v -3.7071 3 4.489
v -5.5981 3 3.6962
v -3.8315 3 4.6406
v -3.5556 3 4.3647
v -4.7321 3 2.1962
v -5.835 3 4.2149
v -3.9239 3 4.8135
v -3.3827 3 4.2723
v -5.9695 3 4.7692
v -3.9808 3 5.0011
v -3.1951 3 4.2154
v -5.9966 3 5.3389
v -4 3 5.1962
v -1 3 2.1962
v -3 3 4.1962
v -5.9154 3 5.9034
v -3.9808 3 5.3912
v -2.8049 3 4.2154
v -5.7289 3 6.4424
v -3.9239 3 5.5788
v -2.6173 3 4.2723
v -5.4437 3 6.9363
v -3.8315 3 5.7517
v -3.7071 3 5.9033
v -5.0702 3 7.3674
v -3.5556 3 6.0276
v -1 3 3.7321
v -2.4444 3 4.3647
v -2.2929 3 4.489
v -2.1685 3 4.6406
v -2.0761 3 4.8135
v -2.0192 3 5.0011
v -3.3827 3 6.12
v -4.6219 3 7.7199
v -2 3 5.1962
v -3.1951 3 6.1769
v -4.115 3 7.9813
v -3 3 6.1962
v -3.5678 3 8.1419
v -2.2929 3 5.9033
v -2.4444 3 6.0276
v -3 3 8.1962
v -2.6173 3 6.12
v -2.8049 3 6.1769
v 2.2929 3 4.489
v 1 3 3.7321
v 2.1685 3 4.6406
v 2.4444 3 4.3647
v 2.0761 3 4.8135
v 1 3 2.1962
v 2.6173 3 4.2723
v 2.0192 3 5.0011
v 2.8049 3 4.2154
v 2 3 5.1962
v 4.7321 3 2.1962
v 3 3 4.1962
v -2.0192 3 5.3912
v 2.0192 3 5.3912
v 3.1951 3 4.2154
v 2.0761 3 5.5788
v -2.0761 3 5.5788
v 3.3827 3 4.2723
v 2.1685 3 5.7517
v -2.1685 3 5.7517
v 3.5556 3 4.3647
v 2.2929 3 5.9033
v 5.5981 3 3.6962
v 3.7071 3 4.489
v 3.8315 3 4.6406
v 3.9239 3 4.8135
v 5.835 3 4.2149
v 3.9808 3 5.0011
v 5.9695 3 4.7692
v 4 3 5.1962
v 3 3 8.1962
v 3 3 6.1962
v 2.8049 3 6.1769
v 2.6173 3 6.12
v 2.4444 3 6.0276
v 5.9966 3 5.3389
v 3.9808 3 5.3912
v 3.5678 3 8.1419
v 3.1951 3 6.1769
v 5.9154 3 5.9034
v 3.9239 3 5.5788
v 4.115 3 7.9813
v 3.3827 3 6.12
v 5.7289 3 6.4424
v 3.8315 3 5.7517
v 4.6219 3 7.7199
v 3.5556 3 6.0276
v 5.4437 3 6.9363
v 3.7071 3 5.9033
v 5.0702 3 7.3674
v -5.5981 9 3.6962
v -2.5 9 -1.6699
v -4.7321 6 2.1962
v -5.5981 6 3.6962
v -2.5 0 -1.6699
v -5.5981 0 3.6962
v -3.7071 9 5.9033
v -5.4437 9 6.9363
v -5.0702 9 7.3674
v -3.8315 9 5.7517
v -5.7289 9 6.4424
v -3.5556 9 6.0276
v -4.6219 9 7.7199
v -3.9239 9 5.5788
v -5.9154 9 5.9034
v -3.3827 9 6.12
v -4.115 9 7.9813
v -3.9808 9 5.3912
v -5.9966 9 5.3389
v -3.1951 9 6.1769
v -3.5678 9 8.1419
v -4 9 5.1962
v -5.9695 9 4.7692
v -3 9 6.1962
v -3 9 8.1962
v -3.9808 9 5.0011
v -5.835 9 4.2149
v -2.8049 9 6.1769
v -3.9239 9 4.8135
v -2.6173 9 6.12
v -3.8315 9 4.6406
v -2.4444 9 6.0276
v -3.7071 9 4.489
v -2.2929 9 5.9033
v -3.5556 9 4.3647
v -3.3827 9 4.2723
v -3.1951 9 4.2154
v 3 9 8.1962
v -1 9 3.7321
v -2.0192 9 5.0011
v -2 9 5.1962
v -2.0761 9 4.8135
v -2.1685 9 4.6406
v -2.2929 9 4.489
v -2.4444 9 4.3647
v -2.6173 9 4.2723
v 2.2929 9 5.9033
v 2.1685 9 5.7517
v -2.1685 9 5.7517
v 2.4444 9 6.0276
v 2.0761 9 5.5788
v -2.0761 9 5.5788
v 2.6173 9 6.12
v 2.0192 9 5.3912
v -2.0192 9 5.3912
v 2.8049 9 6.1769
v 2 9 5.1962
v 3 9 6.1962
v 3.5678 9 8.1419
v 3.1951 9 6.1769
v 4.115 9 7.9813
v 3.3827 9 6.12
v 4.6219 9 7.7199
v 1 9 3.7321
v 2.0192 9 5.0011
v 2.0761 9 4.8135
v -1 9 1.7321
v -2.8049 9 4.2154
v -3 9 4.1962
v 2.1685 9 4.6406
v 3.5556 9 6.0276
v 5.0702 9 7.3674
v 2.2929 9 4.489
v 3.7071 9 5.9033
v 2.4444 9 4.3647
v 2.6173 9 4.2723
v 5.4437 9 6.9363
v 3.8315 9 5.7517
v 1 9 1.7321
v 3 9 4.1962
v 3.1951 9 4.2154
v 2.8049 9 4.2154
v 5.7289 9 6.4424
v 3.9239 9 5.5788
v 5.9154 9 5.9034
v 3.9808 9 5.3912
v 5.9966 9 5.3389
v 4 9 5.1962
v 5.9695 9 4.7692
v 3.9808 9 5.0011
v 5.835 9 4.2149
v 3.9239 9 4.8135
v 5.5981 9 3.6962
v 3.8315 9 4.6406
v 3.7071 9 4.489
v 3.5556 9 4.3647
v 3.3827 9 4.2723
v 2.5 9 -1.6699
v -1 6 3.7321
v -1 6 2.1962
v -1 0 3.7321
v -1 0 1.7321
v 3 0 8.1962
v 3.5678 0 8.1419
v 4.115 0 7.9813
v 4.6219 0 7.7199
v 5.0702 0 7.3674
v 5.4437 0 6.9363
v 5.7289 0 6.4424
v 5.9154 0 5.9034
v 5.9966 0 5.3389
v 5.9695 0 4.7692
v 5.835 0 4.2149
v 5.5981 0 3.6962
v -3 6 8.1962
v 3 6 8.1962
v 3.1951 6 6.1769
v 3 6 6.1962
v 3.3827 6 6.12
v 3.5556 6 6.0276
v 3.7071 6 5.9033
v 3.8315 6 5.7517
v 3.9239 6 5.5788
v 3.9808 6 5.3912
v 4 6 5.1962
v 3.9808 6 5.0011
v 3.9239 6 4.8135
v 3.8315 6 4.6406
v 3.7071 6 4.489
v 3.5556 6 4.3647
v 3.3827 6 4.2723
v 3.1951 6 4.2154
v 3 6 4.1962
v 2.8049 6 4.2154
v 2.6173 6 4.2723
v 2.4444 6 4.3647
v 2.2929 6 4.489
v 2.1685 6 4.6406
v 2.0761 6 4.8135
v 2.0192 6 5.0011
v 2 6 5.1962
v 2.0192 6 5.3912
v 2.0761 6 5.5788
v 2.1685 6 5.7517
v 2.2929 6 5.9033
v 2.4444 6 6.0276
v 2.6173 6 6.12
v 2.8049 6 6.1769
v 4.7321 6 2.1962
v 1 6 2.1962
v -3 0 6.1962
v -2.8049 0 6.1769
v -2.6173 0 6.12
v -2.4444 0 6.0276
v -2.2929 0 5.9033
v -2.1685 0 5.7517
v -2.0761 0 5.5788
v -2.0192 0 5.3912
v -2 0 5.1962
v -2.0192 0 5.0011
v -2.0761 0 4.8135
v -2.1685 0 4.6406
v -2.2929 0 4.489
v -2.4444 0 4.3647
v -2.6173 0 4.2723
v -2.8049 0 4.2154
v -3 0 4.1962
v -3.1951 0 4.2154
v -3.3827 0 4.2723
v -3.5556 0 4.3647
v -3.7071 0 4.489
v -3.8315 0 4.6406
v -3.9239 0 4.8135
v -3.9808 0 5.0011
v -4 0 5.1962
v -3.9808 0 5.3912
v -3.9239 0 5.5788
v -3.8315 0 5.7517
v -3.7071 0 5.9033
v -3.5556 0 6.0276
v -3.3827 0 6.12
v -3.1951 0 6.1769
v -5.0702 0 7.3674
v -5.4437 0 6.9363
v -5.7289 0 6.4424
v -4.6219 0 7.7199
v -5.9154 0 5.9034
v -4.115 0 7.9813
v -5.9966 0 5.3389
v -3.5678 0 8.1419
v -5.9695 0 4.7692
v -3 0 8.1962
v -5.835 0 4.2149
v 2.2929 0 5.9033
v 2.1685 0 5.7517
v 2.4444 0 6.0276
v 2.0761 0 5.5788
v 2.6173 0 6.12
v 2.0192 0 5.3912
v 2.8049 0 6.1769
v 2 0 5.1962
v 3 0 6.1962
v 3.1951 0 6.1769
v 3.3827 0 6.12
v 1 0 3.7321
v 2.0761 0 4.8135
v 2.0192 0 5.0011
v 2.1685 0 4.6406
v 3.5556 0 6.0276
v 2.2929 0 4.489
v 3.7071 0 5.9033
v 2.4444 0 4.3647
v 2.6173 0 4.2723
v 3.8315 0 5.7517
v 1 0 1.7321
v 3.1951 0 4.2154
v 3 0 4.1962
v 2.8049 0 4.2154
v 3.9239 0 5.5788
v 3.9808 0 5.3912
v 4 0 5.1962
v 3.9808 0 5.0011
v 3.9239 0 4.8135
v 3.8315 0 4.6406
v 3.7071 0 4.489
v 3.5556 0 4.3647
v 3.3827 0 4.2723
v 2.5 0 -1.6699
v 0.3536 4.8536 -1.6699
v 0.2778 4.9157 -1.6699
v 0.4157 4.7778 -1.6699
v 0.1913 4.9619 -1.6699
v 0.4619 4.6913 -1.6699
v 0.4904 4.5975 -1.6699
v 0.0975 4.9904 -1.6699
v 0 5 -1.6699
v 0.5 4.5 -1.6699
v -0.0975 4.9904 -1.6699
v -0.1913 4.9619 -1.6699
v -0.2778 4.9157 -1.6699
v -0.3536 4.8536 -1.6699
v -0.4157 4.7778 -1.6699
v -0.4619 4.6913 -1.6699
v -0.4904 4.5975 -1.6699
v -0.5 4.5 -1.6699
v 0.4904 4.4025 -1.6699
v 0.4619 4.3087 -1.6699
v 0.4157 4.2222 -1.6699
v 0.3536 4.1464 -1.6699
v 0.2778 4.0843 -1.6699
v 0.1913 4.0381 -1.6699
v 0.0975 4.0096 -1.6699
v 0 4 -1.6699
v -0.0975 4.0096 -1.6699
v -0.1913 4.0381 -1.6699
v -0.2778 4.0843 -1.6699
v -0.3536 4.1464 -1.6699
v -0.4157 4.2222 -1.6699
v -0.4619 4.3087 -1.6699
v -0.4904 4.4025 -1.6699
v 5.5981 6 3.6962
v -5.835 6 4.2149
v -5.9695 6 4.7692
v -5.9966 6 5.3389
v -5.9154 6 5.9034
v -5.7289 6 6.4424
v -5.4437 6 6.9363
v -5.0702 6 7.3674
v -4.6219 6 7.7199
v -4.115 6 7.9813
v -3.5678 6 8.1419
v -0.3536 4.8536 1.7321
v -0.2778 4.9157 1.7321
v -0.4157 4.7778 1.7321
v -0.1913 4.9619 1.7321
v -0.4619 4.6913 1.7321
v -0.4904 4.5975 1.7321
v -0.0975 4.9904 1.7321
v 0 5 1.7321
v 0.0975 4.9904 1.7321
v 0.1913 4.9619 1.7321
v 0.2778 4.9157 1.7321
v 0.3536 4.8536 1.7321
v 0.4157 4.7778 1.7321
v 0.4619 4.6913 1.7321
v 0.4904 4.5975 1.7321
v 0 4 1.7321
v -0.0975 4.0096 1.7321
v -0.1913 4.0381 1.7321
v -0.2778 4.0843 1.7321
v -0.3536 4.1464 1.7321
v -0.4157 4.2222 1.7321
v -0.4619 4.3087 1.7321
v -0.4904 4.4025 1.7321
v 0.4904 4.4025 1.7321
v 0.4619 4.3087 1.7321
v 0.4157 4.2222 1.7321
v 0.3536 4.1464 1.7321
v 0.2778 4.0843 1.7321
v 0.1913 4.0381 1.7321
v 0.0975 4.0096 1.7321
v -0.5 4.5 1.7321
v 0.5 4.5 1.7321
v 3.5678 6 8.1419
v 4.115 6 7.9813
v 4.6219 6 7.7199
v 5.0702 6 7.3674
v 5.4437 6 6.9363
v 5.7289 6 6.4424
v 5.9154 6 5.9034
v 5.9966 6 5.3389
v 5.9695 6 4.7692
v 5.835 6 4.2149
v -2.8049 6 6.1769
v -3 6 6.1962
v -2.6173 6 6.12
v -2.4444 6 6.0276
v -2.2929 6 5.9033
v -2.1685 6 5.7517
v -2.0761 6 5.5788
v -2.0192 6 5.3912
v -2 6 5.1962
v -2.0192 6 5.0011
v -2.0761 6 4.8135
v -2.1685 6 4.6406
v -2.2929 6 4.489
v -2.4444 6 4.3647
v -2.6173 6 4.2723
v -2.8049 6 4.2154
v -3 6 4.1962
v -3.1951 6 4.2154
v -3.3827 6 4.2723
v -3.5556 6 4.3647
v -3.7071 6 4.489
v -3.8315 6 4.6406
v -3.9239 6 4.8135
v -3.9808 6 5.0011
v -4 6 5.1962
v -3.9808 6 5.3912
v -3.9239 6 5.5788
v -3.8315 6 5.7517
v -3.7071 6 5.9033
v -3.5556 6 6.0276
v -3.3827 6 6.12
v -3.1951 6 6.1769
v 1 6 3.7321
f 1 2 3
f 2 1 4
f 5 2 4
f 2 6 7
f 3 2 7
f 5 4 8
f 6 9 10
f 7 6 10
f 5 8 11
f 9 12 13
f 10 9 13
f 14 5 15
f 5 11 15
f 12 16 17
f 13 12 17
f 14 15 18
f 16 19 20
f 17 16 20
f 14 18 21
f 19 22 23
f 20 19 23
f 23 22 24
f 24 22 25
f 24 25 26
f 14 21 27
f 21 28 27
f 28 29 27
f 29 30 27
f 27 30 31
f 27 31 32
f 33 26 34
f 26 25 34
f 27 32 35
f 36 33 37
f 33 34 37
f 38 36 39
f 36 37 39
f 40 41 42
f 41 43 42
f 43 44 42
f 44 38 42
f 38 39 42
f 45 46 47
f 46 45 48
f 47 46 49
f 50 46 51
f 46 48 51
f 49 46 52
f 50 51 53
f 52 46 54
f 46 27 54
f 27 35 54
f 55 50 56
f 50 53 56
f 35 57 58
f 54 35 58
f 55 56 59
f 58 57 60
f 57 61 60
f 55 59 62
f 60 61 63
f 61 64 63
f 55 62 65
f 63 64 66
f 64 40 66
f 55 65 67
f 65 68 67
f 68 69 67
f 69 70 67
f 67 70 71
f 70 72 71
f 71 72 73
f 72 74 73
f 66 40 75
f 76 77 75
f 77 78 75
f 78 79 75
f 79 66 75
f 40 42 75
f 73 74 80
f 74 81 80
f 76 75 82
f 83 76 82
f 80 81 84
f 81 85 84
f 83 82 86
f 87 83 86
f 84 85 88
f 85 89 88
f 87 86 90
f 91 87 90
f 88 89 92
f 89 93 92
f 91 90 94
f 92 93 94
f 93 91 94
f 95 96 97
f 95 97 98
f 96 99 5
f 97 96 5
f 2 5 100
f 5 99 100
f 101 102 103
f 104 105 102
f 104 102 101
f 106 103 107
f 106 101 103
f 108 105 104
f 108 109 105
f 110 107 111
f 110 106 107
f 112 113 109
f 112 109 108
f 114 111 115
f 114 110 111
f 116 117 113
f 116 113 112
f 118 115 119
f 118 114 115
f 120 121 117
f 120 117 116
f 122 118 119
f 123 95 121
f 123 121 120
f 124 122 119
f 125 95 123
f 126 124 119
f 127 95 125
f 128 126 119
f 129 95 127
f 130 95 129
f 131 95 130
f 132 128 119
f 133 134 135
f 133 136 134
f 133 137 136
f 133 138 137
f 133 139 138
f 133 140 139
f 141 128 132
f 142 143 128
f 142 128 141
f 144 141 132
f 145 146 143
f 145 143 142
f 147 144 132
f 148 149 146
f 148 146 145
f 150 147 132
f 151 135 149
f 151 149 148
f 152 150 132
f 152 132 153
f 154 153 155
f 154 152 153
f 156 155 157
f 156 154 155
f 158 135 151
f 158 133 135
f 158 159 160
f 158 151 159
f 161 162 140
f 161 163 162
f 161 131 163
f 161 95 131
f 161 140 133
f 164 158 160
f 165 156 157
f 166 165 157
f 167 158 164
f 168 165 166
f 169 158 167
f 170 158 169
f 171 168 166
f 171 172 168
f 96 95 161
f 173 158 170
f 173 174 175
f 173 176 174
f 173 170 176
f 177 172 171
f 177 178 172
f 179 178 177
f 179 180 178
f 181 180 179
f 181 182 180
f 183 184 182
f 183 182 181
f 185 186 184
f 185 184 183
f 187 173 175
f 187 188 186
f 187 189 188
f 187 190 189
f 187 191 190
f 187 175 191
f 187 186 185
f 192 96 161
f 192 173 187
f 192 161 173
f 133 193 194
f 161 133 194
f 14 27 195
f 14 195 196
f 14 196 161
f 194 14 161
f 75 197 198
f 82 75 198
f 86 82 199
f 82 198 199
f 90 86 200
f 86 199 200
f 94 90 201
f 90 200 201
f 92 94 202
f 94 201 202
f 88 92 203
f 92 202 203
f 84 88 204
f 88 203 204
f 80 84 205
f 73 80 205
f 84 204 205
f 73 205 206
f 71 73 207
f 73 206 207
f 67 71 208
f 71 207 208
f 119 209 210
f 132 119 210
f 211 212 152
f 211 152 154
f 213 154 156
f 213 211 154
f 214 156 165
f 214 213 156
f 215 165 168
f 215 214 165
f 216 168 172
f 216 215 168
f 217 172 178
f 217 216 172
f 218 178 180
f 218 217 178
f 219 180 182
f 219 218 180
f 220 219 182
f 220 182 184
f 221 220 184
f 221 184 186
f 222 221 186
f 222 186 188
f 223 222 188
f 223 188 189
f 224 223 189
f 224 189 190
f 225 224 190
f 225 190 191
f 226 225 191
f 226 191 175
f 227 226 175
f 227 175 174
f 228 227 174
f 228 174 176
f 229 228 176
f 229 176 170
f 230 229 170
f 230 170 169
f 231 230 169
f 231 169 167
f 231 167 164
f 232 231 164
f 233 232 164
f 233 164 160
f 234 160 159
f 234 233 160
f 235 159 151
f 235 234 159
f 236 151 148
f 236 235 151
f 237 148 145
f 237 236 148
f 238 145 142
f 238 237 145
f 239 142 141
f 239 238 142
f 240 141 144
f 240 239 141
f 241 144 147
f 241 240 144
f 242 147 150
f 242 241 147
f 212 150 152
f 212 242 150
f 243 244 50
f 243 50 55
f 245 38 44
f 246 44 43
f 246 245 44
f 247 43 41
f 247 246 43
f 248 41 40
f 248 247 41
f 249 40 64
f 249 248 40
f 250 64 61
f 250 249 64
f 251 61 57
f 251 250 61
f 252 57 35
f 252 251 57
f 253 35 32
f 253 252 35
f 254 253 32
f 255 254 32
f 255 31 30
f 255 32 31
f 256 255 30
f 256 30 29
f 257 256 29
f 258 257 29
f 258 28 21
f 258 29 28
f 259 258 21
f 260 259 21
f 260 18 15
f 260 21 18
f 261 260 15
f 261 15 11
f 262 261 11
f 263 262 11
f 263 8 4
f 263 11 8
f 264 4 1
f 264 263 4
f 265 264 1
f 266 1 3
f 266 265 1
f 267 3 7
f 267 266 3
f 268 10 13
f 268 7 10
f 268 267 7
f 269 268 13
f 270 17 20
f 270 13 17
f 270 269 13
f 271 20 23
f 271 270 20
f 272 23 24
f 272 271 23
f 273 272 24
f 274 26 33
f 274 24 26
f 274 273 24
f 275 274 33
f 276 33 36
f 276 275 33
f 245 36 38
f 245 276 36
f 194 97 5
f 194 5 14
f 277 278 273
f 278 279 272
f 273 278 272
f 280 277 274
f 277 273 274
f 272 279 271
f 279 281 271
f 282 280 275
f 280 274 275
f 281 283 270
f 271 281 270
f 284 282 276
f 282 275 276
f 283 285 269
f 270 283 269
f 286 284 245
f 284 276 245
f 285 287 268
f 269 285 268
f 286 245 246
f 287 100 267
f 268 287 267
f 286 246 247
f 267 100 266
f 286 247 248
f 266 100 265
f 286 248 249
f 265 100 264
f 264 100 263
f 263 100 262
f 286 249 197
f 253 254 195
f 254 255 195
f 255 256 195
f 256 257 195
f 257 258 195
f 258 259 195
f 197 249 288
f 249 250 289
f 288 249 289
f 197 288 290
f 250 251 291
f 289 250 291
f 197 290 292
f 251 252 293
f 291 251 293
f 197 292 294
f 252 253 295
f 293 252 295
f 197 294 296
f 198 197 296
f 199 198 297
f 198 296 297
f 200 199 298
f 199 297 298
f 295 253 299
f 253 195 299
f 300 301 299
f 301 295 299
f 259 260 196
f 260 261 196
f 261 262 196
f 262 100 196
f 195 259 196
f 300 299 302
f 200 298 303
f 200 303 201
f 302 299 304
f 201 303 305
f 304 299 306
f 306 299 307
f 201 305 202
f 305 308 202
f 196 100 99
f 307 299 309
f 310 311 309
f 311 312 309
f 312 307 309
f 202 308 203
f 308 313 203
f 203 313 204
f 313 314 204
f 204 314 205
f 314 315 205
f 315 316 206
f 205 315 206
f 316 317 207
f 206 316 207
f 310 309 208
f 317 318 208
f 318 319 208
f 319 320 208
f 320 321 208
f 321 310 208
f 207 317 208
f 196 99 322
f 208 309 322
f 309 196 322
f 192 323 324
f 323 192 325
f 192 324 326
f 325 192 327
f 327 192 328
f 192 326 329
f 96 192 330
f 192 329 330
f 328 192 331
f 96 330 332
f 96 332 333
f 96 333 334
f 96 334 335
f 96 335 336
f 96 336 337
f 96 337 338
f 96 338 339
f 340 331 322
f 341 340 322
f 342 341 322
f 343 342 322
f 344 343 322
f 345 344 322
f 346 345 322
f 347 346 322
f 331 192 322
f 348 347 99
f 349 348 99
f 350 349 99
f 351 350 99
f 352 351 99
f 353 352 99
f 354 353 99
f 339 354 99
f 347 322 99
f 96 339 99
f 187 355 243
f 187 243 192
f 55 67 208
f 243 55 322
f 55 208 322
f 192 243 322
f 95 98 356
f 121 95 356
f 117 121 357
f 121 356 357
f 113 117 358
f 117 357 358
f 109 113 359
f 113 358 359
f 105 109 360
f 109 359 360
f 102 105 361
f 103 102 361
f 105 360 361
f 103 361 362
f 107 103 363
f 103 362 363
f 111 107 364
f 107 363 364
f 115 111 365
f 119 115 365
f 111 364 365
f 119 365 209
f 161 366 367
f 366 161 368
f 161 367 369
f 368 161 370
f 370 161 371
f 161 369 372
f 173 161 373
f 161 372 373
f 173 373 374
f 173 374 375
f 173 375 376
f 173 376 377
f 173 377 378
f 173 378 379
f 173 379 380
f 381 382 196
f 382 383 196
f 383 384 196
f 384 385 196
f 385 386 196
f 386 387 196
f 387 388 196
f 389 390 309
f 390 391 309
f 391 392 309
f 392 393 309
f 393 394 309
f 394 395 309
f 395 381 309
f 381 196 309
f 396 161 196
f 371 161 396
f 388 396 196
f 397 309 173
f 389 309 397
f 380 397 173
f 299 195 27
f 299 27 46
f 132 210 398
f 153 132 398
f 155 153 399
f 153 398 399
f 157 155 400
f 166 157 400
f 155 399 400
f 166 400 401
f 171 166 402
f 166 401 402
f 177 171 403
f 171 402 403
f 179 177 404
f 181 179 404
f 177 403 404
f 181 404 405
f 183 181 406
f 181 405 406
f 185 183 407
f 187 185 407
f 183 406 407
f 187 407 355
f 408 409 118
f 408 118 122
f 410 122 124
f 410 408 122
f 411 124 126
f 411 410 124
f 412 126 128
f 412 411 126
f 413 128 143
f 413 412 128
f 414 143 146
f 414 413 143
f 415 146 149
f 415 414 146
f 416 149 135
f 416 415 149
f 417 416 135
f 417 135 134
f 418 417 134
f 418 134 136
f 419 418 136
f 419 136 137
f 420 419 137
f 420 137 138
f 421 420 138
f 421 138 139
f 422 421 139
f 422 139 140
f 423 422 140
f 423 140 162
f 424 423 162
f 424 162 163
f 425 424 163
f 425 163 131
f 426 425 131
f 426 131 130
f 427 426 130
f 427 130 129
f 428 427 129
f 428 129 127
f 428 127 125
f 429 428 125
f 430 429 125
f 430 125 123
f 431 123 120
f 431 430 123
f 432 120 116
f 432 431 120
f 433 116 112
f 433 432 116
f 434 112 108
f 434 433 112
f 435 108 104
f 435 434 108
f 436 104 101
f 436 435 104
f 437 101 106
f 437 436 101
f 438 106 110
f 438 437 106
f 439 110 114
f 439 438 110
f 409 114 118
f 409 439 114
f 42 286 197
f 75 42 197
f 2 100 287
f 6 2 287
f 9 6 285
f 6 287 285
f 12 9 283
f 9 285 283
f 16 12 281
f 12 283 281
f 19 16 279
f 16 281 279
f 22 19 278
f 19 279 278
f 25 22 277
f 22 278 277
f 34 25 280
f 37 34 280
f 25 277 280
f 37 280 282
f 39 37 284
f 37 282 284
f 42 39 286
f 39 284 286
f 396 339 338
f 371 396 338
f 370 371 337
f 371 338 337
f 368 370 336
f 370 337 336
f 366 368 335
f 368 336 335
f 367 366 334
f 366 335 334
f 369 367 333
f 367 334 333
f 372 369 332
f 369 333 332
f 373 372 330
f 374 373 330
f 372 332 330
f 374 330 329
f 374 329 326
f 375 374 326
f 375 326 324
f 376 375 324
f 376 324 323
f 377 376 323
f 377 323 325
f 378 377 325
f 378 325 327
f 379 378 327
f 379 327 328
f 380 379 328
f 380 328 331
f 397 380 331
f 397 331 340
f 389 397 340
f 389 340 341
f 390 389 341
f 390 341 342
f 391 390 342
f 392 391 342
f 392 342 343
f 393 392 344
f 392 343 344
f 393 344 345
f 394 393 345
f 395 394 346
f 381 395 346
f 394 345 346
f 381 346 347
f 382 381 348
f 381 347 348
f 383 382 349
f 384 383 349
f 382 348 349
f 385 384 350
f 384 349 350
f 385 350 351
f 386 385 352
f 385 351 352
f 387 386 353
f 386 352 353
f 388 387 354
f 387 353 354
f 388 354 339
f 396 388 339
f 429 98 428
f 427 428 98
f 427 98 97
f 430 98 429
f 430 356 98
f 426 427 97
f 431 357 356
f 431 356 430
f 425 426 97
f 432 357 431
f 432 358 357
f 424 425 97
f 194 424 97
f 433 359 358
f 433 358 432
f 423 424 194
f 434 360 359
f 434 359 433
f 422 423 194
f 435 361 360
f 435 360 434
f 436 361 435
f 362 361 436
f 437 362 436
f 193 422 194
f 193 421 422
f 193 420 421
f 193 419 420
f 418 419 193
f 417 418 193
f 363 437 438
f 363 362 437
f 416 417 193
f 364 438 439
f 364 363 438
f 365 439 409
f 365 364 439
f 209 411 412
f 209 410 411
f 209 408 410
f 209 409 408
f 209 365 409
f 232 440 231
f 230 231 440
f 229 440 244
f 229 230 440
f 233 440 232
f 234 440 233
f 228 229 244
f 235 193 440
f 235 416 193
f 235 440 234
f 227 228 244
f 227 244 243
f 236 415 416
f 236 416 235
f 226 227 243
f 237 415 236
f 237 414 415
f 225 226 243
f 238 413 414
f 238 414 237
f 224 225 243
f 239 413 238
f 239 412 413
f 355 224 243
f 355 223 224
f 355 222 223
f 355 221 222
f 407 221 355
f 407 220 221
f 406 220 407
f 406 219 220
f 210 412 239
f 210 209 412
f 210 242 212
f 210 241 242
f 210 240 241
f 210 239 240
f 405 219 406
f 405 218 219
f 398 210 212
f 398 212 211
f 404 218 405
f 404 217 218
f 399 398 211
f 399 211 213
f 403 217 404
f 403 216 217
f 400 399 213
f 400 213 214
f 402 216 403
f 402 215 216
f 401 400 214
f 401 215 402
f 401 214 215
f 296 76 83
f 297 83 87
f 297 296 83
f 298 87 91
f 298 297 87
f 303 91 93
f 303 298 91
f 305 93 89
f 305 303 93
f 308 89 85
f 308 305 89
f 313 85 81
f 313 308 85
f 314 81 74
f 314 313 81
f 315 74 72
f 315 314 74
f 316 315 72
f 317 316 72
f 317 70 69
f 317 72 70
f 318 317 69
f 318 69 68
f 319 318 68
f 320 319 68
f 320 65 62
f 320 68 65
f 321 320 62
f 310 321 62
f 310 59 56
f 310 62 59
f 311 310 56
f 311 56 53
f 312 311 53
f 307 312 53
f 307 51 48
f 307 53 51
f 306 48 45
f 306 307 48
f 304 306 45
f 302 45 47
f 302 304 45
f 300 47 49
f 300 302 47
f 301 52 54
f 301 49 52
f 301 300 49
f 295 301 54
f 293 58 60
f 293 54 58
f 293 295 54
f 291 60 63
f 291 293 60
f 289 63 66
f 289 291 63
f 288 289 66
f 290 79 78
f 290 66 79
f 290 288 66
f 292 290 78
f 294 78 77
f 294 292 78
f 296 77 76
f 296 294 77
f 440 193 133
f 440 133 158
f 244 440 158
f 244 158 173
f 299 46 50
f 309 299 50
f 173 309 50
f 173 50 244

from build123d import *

# Parameters (mm, degrees)
CROQUIS1_R              = 1
CROQUIS1_W              = 2
CROQUIS1_H              = 2
SALIENTE_EXTRUIR1_DEPTH = 9
CROQUIS2_W              = 12
CROQUIS2_H              = 3
CORTAR_EXTRUIR1_DEPTH   = 6
CORTAR_EXTRUIR2_REACH   = 16.64
CROQUIS3_R              = 0.5


with BuildPart() as part:
    # Croquis1 → Saliente-Extruir1 (new body)
    with BuildSketch(Plane(origin=(0, 0, 0), x_dir=(1, 0, 0), z_dir=(0, 1, 0))):
        with BuildLine():
            Line((5.598076211, -3.696152423), (2.5, 1.669872981))
            Line((2.5, 1.669872981), (-2.5, 1.669872981))
            Line((-2.5, 1.669872981), (-5.598076211, -3.696152423))
            ThreePointArc((-5.598076211, -3.696152423), (-5.598076211, -6.696152423), (-3, -8.196152423))
            Line((-3, -8.196152423), (3, -8.196152423))
            ThreePointArc((3, -8.196152423), (5.598076211, -6.696152423), (5.598076211, -3.696152423))
        make_face()
        with Locations(Location((-3, -5.196152423, 0), (0, 0, 270))):
            Circle(CROQUIS1_R, mode=Mode.SUBTRACT)
        with Locations(Location((3, -5.196152423, 0), (0, 0, 270))):
            Circle(CROQUIS1_R, mode=Mode.SUBTRACT)
        with Locations((0, -2.732050808)):
            Rectangle(CROQUIS1_W, CROQUIS1_H, mode=Mode.SUBTRACT)
    extrude(amount=SALIENTE_EXTRUIR1_DEPTH)

    # Croquis2 → Cortar-Extruir1 (cut)
    with BuildSketch(Plane.XY.offset(8.196152423)):
        with Locations((0, 4.5)):
            Rectangle(CROQUIS2_W, CROQUIS2_H)
    extrude(amount=-CORTAR_EXTRUIR1_DEPTH, mode=Mode.SUBTRACT)

    # Croquis3 → Cortar-Extruir2 (cut, up to next)
    with BuildSketch(Plane(origin=(0, 0, -1.669872981), x_dir=(-1, 0, 0), z_dir=(0, 0, -1)), mode=Mode.PRIVATE) as cortar_extruir2_sk1:
        with Locations((0, 4.5)):
            Circle(CROQUIS3_R)
    cortar_extruir2_tool1 = extrude(cortar_extruir2_sk1.sketch, amount=-CORTAR_EXTRUIR2_REACH, mode=Mode.PRIVATE) & part.part
    add(cortar_extruir2_tool1.solids().sort_by_distance((0, 4.5, -1.669873))[0], mode=Mode.SUBTRACT)


solid = part.part
